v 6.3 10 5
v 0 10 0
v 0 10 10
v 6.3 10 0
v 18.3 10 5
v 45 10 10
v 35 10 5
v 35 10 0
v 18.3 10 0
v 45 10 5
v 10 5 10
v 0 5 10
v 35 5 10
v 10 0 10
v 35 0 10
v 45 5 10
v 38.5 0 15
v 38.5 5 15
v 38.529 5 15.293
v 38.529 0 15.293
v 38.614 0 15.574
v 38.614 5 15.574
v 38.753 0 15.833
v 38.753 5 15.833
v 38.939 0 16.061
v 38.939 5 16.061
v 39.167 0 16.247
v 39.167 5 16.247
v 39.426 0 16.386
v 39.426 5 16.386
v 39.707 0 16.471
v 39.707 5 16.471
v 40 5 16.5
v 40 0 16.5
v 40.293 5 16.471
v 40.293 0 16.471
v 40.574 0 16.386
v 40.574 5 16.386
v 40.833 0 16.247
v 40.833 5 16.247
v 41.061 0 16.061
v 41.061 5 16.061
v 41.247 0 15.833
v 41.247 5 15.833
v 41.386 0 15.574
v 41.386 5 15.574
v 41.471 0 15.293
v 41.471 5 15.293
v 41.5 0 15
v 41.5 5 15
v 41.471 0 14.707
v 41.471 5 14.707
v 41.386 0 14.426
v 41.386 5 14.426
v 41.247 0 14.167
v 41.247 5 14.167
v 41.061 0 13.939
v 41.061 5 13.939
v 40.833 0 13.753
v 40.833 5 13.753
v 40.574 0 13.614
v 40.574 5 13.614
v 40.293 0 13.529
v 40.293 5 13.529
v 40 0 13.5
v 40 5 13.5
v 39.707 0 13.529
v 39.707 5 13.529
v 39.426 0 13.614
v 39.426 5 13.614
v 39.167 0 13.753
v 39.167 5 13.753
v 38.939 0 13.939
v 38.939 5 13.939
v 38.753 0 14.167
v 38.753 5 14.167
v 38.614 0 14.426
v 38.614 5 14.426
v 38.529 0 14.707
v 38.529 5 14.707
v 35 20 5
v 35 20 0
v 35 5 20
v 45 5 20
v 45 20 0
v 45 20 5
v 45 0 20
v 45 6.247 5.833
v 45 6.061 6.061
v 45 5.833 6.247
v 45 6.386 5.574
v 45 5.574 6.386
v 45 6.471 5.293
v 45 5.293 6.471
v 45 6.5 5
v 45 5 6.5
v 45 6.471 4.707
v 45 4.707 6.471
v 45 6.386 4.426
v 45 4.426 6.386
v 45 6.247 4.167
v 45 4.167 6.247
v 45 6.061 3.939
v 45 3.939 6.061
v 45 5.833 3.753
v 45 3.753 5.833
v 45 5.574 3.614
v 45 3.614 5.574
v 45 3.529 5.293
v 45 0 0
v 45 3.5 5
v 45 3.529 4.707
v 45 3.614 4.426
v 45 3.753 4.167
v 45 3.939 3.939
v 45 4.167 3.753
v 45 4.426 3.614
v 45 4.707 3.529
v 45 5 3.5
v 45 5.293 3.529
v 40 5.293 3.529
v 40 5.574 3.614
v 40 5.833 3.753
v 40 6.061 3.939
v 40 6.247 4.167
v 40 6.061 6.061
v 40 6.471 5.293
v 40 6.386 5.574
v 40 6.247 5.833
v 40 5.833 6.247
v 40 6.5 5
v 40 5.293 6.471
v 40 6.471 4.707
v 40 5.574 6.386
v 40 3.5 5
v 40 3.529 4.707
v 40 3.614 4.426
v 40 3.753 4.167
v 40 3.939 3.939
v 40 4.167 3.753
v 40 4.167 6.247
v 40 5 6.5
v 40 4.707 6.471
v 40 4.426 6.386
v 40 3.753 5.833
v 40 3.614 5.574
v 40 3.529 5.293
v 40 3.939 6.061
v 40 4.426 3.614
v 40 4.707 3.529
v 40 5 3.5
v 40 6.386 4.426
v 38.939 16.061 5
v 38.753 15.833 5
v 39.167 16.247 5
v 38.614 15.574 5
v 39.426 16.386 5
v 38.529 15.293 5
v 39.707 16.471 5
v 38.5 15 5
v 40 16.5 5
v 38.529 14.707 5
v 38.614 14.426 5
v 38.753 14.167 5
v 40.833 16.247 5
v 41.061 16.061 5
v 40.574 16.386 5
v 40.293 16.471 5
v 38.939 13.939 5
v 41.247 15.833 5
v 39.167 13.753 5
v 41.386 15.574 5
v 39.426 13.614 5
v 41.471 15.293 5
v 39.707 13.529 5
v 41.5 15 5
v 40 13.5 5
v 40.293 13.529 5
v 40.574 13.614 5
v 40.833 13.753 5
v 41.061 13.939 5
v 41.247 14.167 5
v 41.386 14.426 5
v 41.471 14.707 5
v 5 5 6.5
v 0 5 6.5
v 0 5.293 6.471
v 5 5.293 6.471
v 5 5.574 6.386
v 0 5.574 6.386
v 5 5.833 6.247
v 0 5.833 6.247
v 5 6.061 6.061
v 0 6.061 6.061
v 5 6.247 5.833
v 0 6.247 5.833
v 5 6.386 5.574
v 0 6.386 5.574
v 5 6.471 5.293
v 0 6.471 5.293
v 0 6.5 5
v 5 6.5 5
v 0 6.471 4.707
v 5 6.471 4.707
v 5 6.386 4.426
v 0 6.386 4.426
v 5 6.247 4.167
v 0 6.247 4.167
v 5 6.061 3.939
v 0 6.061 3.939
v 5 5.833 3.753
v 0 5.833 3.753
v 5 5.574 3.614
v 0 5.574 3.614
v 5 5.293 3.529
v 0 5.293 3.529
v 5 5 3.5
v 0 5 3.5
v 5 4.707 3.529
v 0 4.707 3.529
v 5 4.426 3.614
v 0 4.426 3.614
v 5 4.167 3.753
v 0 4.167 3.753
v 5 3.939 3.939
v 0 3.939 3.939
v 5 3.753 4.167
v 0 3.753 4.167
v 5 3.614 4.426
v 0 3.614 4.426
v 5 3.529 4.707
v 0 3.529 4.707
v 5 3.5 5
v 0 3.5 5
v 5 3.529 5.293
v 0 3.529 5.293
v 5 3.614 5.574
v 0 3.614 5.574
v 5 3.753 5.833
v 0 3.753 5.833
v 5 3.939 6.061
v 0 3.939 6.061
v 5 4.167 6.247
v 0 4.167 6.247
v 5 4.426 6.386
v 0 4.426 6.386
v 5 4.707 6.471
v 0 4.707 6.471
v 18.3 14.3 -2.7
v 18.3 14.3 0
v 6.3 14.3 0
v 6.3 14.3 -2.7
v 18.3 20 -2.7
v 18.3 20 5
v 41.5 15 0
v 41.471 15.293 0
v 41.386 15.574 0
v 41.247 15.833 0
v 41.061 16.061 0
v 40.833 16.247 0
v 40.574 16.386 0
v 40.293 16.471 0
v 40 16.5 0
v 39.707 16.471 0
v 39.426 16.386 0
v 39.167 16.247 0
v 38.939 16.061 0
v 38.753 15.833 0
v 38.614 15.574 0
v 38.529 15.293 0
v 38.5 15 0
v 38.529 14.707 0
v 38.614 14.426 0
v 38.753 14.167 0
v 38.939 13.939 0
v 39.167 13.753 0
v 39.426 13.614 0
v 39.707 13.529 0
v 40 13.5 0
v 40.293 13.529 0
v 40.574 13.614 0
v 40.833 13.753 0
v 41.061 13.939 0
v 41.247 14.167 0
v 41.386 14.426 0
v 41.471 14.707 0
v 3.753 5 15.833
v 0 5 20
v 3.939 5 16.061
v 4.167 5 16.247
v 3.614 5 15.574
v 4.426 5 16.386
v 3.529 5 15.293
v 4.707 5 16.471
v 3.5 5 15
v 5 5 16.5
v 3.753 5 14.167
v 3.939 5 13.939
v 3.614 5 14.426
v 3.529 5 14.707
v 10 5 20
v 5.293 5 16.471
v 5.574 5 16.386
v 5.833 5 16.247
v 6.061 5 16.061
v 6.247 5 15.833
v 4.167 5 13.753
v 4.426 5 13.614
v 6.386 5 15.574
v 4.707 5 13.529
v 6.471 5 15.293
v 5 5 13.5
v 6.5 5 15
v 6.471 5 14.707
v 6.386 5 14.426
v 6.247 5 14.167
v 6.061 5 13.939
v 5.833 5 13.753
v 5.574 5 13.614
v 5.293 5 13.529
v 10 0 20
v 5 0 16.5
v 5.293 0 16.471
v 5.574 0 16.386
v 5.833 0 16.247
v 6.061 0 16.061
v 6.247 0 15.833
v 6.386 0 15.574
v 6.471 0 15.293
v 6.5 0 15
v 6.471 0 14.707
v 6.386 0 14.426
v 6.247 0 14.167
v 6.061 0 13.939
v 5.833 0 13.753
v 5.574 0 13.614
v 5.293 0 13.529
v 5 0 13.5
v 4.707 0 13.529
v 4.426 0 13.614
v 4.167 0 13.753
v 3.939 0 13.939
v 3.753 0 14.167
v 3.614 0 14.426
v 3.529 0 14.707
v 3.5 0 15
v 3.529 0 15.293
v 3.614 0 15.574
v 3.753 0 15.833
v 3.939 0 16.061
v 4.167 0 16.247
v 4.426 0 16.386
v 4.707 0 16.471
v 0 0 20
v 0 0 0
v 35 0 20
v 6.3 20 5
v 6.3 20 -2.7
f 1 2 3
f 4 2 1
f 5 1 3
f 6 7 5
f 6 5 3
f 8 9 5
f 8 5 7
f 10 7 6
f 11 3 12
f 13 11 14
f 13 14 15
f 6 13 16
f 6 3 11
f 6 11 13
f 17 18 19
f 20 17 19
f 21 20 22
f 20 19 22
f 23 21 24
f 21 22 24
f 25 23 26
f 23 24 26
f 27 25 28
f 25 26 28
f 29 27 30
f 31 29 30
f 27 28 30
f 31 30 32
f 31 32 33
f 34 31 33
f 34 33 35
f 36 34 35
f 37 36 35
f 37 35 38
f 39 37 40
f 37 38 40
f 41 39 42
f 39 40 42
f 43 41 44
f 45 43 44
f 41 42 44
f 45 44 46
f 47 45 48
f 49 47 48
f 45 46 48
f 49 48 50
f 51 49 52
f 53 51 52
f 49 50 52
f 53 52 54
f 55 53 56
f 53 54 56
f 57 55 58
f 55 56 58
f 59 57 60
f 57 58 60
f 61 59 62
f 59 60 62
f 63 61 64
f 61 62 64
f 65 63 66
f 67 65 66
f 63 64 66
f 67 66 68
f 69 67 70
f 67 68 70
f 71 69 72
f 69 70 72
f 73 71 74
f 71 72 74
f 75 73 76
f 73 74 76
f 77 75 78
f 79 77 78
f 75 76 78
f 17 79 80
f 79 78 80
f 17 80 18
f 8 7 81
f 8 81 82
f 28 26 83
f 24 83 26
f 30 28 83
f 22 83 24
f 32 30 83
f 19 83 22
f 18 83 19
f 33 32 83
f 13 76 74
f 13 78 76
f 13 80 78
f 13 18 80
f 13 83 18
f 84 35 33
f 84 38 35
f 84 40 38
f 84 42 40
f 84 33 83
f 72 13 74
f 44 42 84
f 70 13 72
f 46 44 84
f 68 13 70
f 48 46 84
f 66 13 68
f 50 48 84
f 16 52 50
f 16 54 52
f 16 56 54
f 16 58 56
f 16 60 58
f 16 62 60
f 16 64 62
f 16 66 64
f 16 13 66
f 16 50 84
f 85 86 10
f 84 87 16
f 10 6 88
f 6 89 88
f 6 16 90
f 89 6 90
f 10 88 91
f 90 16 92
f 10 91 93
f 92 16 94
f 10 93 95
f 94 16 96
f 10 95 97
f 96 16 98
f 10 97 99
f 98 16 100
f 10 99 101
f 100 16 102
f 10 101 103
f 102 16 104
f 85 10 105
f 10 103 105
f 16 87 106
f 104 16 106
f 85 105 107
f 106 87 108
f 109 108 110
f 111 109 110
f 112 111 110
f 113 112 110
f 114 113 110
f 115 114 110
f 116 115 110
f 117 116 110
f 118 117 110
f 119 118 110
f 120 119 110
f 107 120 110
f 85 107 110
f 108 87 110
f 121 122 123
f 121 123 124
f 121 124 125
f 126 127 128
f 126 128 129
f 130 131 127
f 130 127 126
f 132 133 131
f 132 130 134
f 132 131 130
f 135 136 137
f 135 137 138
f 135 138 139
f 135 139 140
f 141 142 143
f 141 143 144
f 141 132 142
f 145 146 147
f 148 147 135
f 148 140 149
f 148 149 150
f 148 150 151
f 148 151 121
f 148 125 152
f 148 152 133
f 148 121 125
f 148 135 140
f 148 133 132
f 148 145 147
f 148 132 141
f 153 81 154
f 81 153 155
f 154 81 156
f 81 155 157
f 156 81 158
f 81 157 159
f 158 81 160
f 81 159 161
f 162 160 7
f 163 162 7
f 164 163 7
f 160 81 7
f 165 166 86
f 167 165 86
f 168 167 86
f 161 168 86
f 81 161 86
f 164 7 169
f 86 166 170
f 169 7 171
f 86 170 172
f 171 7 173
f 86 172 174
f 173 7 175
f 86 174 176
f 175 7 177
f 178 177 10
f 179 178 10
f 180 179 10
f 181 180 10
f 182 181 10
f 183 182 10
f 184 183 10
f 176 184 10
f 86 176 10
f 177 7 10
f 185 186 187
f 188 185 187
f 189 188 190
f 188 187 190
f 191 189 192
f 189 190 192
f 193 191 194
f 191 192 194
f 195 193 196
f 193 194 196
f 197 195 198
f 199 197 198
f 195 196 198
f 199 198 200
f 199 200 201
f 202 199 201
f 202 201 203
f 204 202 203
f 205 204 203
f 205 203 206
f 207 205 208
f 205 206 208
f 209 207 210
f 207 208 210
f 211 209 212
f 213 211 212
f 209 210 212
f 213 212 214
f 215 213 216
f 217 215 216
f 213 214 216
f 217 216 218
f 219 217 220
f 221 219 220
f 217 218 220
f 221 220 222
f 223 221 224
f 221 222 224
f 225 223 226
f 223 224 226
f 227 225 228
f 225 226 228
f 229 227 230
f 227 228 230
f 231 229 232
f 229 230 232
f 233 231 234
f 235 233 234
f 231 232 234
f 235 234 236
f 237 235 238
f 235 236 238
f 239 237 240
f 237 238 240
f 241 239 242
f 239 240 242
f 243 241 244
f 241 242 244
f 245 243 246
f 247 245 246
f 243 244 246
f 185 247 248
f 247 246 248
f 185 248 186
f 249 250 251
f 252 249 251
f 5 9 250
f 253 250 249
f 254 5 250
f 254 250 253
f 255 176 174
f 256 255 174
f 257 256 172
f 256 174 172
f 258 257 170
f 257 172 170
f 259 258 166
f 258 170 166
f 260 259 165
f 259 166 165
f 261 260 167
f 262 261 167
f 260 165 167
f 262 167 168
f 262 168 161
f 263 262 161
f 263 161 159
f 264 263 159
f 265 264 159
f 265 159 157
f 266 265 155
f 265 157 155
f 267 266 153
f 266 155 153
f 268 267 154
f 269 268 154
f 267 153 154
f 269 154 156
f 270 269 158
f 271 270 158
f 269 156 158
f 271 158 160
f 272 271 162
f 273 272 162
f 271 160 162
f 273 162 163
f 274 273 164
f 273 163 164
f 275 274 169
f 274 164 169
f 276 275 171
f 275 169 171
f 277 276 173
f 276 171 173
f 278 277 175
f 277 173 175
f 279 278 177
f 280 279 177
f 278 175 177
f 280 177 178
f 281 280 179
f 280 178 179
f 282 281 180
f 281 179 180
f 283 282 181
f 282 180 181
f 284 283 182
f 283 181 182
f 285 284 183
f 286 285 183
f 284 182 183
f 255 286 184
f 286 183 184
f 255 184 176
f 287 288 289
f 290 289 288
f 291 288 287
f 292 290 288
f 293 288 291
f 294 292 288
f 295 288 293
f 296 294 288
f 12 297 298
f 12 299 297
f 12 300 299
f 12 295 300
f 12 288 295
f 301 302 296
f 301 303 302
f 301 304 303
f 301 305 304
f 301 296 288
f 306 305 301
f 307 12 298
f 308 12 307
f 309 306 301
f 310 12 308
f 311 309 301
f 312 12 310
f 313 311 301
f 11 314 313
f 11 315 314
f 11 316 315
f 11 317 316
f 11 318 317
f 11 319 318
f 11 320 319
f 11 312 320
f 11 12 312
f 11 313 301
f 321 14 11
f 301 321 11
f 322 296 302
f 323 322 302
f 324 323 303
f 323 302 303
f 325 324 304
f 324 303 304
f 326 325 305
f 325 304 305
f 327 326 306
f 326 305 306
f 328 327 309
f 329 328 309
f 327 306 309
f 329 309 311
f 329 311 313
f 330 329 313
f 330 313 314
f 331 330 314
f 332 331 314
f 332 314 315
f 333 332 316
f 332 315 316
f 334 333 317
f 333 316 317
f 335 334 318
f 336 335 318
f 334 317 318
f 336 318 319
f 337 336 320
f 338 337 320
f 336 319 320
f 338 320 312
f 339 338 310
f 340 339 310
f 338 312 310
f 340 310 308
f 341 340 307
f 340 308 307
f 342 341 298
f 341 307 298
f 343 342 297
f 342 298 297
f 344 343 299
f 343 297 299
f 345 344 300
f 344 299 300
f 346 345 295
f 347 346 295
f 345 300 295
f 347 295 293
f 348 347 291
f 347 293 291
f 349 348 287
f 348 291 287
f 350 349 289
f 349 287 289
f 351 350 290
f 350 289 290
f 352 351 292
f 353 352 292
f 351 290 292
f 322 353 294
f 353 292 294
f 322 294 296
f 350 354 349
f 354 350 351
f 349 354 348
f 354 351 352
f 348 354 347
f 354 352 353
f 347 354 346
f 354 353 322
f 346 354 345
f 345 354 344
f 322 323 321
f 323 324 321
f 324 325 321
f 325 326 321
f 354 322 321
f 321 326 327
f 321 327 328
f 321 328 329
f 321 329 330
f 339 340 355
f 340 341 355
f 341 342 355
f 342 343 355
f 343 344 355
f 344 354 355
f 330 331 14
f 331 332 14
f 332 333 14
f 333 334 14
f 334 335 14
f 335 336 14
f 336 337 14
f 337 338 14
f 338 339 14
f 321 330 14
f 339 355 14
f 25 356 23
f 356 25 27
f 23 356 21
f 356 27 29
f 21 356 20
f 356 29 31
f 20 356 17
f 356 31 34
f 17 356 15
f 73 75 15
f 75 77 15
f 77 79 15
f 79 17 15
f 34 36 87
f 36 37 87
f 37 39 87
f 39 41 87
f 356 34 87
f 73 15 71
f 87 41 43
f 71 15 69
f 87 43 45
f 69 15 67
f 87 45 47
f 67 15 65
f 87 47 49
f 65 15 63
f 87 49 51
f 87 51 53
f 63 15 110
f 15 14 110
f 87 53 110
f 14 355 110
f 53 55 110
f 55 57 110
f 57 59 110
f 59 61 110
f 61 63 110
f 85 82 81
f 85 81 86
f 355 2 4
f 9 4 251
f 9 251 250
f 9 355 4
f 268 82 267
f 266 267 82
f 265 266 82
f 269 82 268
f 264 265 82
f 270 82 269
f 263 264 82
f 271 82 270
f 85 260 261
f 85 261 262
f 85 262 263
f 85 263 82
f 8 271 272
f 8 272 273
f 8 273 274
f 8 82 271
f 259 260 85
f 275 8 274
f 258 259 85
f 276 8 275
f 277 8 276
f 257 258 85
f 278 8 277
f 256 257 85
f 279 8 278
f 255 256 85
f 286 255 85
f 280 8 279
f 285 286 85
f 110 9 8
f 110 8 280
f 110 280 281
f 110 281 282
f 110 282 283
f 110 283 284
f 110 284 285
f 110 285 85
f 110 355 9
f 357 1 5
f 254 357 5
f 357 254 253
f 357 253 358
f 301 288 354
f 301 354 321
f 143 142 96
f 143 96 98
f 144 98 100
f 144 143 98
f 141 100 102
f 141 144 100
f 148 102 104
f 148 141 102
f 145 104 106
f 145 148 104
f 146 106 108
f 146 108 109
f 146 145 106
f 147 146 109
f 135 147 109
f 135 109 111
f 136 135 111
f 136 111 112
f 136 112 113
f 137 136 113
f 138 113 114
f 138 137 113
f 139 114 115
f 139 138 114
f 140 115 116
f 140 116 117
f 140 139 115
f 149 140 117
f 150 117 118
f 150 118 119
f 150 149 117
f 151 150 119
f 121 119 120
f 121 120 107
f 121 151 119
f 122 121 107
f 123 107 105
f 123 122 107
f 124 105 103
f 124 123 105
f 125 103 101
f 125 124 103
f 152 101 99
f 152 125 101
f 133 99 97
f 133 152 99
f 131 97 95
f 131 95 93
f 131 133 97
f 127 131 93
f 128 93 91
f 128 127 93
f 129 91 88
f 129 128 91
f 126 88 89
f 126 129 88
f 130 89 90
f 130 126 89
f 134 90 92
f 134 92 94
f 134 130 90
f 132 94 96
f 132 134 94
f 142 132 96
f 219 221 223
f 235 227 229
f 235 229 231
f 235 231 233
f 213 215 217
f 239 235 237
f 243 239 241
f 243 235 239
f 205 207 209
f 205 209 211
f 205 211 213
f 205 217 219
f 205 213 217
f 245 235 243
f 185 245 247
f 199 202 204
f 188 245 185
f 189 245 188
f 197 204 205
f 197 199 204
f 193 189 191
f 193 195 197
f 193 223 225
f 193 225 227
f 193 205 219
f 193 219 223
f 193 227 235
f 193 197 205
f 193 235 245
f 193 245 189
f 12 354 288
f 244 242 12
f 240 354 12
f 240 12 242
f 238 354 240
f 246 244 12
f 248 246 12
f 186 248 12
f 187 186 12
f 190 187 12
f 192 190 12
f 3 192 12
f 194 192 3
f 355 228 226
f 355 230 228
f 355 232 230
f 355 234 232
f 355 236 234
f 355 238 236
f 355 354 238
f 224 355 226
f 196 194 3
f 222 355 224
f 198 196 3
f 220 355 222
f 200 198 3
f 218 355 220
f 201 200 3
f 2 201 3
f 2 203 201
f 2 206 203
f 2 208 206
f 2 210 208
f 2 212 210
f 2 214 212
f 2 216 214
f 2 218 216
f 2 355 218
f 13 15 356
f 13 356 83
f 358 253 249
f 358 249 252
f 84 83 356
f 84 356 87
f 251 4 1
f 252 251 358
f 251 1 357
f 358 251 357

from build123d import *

# Parameters (mm, degrees)
SKETCH1_W           = 45
SKETCH1_H           = 10
BOSS_EXTRUDE1_DEPTH = 10
SKETCH2_W           = 10
SKETCH2_H           = 5
SKETCH2_W_2         = 12
BOSS_EXTRUDE2_DEPTH = 10
SKETCH3_W           = 10
SKETCH3_H           = 5
BOSS_EXTRUDE3_DEPTH = 10
SKETCH4_R           = 1.5
CUT_EXTRUDE1_DEPTH  = 5
SKETCH6_R           = 1.5
CUT_EXTRUDE3_DEPTH  = 5
CUT_EXTRUDE4_START  = -5
SKETCH7_R           = 1.5
CUT_EXTRUDE4_DEPTH  = 5
SKETCH9_R           = 1.5
CUT_EXTRUDE6_DEPTH  = 5
SKETCH10_R          = 1.5
CUT_EXTRUDE7_DEPTH  = 5
SKETCH11_W          = 12
SKETCH11_H          = 5.7
BOSS_EXTRUDE4_DEPTH = 2.7


with BuildPart() as part:
    # Sketch1 → Boss-Extrude1 (new body)
    with BuildSketch(Plane.XY):
        with Locations((22.5, 5)):
            Rectangle(SKETCH1_W, SKETCH1_H)
    extrude(amount=BOSS_EXTRUDE1_DEPTH)

    # Sketch2 → Boss-Extrude2 (add)
    with BuildSketch(Plane(origin=(0, 10, 0), x_dir=(1, 0, 0), z_dir=(0, 1, 0))):
        with Locations((40, -2.5)):
            Rectangle(SKETCH2_W, SKETCH2_H)
        with Locations((12.3, -2.5)):
            Rectangle(SKETCH2_W_2, SKETCH2_H)
    extrude(amount=BOSS_EXTRUDE2_DEPTH)

    # Sketch3 → Boss-Extrude3 (add)
    with BuildSketch(Plane.XY.offset(10)):
        with Locations((5, 2.5)):
            Rectangle(SKETCH3_W, SKETCH3_H)
        with Locations((40, 2.5)):
            Rectangle(SKETCH3_W, SKETCH3_H)
    extrude(amount=BOSS_EXTRUDE3_DEPTH)

    # Sketch4 → Cut-Extrude1 (cut)
    with BuildSketch(Plane.ZY):
        with Locations((5, 5)):
            Circle(SKETCH4_R)
    extrude(amount=-CUT_EXTRUDE1_DEPTH, mode=Mode.SUBTRACT)

    # Sketch6 → Cut-Extrude3 (cut)
    with BuildSketch(Plane(origin=(0, 5, 0), x_dir=(1, 0, 0), z_dir=(0, 1, 0))):
        with Locations(Location((5, -15, 0), (0, 0, 270))):
            Circle(SKETCH6_R)
    extrude(amount=-CUT_EXTRUDE3_DEPTH, mode=Mode.SUBTRACT)

    # Sketch7 → Cut-Extrude4 (cut)
    with BuildSketch(Plane(origin=(45, 0, 0), x_dir=(0, 0, -1), z_dir=(1, 0, 0)).offset(CUT_EXTRUDE4_START)):
        with Locations(Location((-5, 5, 0), (0, 0, 180))):
            Circle(SKETCH7_R)
    extrude(amount=CUT_EXTRUDE4_DEPTH, mode=Mode.SUBTRACT)

    # Sketch9 → Cut-Extrude6 (cut)
    with BuildSketch(Plane(origin=(0, 5, 0), x_dir=(1, 0, 0), z_dir=(0, 1, 0))):
        with Locations(Location((40, -15, 0), (0, 0, 180))):
            Circle(SKETCH9_R)
    extrude(amount=-CUT_EXTRUDE6_DEPTH, mode=Mode.SUBTRACT)

    # Sketch10 → Cut-Extrude7 (cut)
    with BuildSketch(Plane.XY.offset(5)):
        with Locations((40, 15)):
            Circle(SKETCH10_R)
    extrude(amount=-CUT_EXTRUDE7_DEPTH, mode=Mode.SUBTRACT)

    # Sketch11 → Boss-Extrude4 (add)
    with BuildSketch(Plane(origin=(0, 0, 0), x_dir=(-1, 0, 0), z_dir=(0, 0, -1))):
        with Locations((-12.3, 17.15)):
            Rectangle(SKETCH11_W, SKETCH11_H)
    extrude(amount=BOSS_EXTRUDE4_DEPTH)


solid = part.part
